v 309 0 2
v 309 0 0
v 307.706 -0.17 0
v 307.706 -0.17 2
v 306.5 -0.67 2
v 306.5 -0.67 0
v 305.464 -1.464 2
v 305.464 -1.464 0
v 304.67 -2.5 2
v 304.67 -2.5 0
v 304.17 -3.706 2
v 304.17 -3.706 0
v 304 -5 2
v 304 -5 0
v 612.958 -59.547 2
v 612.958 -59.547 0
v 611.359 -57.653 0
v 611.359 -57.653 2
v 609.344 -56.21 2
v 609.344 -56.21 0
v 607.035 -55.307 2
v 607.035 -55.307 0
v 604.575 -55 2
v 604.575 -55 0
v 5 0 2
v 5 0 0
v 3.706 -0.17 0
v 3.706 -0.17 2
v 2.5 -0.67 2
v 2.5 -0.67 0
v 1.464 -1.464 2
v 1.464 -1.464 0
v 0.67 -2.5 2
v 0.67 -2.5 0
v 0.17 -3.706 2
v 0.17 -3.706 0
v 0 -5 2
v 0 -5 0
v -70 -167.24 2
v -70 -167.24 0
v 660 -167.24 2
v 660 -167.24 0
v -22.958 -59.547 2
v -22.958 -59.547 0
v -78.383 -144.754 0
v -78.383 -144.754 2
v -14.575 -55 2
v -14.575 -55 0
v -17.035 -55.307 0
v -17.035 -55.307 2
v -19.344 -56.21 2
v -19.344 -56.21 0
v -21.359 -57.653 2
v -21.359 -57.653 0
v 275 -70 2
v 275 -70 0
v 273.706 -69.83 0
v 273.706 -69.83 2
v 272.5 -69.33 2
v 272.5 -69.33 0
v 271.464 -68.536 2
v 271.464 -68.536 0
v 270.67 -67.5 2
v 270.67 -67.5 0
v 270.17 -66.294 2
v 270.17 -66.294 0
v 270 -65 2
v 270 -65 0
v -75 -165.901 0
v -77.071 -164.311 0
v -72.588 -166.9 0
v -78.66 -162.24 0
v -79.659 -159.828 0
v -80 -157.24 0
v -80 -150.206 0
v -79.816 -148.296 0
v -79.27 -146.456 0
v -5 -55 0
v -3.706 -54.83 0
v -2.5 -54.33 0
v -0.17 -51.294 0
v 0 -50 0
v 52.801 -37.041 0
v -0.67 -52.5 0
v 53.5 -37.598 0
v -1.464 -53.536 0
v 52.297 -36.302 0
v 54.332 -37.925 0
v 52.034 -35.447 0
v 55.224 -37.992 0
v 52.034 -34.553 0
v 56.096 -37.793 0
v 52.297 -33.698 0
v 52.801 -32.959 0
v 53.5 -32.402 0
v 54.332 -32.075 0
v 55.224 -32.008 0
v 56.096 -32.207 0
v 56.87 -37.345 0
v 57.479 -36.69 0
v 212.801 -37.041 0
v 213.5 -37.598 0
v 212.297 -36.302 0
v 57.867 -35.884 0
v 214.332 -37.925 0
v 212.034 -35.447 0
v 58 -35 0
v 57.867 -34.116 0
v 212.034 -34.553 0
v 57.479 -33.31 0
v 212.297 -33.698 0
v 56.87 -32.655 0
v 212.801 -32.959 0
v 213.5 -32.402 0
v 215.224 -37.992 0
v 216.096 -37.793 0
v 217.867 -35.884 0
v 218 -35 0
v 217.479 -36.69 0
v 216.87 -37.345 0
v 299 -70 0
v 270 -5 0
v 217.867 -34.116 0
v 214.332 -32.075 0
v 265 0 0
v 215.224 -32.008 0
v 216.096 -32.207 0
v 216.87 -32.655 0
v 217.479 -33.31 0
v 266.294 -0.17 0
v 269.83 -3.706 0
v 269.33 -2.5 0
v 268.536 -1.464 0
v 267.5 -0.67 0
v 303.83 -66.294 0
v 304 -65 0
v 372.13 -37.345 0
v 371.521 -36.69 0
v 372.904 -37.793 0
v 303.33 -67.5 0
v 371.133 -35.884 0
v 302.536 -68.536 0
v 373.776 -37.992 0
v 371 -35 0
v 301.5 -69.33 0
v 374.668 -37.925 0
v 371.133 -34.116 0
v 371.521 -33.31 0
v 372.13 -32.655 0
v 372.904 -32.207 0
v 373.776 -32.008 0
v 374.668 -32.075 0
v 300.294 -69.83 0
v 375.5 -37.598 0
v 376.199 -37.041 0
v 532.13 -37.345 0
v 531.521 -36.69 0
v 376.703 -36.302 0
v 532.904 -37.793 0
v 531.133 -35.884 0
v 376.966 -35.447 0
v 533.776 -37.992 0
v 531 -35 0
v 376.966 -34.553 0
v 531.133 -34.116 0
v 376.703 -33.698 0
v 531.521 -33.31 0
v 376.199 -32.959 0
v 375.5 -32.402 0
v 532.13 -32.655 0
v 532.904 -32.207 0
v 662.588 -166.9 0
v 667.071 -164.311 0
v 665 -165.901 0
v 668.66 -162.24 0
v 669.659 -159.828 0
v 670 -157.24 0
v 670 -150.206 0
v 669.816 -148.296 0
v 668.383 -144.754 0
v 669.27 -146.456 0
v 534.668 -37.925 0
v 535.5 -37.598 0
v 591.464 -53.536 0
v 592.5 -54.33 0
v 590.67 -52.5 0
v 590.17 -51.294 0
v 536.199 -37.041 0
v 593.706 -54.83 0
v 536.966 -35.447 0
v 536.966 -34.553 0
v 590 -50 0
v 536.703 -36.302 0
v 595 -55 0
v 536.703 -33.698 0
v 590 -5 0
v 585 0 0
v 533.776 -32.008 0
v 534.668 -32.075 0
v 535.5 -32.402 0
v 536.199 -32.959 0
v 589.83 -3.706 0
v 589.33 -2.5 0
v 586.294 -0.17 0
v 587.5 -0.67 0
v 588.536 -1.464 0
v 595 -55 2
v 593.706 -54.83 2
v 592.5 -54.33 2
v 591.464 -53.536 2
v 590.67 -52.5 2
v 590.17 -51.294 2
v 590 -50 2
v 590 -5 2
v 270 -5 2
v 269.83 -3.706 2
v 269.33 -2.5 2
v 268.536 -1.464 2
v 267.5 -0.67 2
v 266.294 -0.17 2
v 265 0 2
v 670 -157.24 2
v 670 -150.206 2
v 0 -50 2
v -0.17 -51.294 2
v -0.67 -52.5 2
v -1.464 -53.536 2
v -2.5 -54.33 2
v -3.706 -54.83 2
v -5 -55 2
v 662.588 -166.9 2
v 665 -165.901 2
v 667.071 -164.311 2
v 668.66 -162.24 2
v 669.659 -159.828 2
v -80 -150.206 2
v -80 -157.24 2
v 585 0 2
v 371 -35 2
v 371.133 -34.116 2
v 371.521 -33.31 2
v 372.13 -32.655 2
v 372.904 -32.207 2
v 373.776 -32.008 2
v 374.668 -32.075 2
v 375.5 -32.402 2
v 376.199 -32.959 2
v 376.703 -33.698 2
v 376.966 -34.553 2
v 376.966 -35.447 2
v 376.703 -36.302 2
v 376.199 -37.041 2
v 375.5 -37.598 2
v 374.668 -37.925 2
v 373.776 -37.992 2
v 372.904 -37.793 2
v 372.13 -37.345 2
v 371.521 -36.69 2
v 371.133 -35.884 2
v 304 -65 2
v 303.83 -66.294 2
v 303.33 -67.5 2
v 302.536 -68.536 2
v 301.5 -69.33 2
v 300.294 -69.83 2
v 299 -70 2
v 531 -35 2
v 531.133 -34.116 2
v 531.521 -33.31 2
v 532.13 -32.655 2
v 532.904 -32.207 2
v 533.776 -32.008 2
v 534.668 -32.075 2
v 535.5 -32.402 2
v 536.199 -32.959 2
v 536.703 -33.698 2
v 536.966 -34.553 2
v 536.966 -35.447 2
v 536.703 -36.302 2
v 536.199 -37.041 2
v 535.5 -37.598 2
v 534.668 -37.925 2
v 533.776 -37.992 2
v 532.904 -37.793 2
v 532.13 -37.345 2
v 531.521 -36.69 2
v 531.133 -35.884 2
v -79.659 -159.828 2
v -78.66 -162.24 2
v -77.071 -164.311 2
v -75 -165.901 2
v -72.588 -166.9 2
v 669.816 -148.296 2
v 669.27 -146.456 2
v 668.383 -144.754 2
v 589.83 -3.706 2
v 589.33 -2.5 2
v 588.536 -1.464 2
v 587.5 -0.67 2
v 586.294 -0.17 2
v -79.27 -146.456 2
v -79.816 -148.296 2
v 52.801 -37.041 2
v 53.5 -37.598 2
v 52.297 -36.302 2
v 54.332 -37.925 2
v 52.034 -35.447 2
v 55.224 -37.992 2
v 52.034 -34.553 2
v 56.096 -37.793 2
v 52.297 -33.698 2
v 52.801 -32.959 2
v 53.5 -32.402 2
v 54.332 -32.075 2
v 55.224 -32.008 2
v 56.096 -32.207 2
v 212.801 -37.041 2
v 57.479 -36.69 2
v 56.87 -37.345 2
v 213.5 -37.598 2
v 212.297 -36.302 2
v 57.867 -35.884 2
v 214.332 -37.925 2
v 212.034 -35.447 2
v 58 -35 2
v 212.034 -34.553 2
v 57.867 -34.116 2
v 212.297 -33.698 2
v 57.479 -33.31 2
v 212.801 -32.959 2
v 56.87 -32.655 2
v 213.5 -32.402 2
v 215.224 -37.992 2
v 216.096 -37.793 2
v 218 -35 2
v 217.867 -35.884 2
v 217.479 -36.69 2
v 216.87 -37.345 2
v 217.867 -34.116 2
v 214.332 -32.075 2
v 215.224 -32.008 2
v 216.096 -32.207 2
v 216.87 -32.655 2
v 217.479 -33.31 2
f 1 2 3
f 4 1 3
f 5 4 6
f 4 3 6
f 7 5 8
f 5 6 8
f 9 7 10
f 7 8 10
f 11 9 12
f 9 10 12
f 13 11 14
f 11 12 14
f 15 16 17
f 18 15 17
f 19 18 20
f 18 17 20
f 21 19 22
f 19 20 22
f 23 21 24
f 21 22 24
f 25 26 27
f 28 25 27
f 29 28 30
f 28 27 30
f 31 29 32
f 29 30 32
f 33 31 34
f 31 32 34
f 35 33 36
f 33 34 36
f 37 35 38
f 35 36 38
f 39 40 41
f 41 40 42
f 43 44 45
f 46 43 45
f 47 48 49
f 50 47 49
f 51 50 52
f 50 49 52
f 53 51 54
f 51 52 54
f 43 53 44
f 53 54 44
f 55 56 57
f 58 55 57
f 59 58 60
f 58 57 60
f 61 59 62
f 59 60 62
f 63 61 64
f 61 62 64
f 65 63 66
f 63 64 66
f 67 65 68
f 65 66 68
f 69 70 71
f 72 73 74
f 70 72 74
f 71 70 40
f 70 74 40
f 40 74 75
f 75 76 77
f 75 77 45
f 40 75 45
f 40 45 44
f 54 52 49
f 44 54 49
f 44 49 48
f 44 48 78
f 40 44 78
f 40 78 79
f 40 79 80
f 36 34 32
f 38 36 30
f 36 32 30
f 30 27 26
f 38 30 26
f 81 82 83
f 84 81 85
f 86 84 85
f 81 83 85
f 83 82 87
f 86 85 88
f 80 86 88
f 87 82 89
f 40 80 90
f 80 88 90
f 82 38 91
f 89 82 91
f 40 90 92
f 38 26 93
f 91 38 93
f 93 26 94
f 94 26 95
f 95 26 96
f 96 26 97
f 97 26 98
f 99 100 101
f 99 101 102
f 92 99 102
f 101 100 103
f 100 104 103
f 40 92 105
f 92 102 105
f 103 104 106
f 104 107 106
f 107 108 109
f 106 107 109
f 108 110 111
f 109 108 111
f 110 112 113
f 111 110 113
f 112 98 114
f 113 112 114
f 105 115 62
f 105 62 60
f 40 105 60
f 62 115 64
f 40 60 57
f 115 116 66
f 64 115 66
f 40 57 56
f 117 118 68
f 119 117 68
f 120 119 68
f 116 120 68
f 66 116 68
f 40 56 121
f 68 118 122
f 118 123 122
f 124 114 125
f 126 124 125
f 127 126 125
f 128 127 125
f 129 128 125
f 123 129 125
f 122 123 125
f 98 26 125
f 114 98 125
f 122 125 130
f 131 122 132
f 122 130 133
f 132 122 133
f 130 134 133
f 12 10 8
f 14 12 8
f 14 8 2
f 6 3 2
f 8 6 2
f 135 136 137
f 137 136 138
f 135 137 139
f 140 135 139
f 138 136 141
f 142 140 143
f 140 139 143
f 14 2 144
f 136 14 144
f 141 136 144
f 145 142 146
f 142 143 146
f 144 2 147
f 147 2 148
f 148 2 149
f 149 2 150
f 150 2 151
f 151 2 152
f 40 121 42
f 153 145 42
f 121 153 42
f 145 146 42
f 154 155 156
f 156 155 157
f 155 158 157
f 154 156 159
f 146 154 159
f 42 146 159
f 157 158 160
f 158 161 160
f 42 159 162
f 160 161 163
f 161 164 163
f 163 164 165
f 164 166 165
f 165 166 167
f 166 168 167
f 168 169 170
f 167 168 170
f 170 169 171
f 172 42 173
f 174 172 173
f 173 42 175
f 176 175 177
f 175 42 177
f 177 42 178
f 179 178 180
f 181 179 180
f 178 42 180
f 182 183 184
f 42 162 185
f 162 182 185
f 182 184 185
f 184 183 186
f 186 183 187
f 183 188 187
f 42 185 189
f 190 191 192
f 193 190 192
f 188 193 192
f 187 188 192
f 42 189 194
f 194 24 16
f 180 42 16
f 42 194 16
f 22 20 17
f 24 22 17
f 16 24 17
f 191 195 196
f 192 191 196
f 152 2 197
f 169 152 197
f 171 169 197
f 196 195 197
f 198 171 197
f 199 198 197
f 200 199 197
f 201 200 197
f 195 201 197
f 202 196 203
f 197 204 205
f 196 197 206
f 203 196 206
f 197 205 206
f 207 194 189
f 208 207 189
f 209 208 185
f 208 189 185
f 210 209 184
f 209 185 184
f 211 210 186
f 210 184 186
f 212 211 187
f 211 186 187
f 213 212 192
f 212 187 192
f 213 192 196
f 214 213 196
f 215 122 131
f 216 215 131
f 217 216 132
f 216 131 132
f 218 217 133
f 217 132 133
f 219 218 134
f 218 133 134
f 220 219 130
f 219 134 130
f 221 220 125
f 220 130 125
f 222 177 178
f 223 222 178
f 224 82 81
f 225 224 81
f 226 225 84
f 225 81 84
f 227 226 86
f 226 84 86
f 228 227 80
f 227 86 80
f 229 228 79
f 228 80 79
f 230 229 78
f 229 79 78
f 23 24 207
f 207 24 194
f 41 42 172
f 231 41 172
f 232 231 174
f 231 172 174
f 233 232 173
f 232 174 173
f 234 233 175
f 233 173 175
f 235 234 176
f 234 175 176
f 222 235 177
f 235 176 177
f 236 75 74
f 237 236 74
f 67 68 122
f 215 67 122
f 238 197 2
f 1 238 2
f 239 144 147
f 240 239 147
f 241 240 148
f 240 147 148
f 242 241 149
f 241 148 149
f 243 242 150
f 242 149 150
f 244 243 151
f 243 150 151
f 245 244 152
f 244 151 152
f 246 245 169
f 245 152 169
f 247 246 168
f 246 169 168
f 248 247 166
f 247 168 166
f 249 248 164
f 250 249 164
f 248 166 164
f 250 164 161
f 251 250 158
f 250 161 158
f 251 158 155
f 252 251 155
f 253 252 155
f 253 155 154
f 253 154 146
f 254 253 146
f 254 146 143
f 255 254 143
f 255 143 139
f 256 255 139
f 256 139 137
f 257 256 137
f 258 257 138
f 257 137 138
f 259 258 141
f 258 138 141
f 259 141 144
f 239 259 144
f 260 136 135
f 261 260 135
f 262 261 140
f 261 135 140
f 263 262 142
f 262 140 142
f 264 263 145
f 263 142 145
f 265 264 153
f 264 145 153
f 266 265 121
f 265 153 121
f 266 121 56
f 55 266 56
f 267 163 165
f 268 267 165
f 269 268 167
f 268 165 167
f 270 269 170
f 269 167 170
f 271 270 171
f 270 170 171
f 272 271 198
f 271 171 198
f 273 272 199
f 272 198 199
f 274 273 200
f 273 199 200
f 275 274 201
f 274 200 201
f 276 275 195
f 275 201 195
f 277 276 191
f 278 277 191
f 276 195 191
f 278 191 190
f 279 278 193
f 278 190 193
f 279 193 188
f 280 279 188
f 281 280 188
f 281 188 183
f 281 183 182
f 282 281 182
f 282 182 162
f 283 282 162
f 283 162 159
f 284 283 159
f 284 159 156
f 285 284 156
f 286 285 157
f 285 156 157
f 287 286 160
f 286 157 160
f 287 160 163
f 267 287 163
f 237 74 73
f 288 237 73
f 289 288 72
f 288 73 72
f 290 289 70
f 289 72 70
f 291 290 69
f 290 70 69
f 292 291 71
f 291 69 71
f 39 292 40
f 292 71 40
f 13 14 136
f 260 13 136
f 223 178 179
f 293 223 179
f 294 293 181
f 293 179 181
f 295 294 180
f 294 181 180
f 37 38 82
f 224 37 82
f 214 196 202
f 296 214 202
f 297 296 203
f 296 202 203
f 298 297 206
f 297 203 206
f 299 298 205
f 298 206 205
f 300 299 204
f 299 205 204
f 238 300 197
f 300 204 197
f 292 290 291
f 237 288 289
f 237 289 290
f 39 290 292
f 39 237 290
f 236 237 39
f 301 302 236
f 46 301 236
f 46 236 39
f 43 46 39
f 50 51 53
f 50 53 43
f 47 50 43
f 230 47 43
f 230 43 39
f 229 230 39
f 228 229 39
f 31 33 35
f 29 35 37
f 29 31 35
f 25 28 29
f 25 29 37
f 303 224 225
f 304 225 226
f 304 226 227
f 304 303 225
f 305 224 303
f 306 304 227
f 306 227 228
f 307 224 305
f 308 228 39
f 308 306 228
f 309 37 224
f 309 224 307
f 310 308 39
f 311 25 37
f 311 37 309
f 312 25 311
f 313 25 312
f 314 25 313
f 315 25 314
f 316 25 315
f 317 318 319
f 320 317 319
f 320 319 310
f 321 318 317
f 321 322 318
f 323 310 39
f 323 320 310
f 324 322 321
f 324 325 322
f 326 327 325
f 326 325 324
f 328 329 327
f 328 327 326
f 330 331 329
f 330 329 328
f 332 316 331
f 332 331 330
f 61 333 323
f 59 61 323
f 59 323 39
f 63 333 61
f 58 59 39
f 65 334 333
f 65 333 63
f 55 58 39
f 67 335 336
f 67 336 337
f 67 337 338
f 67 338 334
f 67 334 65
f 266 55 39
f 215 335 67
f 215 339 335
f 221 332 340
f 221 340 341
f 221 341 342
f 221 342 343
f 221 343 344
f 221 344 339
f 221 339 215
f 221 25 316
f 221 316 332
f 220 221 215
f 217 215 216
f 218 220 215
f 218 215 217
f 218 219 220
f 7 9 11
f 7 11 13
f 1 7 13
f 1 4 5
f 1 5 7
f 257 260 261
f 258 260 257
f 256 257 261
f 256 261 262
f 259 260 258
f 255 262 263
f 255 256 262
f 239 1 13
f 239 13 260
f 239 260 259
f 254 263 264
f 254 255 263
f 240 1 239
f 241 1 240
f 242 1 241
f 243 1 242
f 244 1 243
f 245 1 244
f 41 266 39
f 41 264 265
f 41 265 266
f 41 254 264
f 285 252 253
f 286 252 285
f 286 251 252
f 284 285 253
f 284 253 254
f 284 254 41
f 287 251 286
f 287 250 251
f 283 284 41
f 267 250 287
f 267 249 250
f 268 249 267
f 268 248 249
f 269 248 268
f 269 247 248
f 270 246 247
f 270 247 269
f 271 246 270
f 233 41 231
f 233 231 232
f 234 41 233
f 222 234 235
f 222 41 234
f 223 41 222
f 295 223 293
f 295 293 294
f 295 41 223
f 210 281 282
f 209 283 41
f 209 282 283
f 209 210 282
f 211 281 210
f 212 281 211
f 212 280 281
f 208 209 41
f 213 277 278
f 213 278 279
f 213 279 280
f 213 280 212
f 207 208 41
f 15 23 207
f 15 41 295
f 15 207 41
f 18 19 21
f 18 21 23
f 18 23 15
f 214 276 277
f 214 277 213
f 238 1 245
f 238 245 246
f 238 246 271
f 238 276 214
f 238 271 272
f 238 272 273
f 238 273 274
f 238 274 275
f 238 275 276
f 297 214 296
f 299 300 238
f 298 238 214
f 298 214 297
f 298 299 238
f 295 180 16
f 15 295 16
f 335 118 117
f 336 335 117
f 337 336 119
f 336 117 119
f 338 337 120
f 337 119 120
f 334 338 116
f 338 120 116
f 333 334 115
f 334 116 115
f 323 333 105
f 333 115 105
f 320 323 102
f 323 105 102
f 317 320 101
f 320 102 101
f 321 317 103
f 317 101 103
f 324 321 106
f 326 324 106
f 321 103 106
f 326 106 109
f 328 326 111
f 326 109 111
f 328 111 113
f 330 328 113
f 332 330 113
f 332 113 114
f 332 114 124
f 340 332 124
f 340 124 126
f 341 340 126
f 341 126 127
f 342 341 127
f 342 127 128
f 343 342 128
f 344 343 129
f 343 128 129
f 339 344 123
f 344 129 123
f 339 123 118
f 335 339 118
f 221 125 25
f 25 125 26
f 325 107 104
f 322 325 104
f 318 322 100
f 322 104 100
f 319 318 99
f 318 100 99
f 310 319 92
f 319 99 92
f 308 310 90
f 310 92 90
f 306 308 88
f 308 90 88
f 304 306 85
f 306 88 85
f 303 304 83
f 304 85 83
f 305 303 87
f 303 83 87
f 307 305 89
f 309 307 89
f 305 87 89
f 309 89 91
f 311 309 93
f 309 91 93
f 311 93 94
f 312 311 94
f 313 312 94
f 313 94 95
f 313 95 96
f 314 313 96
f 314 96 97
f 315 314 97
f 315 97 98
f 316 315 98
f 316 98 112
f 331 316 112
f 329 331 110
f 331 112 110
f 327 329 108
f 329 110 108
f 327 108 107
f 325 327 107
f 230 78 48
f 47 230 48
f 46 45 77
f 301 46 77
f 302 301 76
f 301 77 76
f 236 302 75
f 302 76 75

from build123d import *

# Parameters (mm, degrees)
F1_DEPTH = 2


with BuildPart() as f1:
    # F0 (on Top) → F1 (new body)
    with BuildSketch(Plane.XY):
        with BuildLine():
            Line((265, 0), (5, 0))
            ThreePointArc((5, 0), (1.464466, -1.464466), (0, -5))
            Line((0, -5), (0, -50))
            ThreePointArc((0, -50), (-1.464466, -53.535534), (-5, -55))
            Line((-5, -55), (-14.575301, -55))
            ThreePointArc((-14.575301, -55), (-19.34359, -56.210039), (-22.957917, -59.547316))
            Line((-22.957917, -59.547316), (-78.382615, -144.753785))
            ThreePointArc((-78.382615, -144.753785), (-79.587131, -147.362717), (-80, -150.206469))
            Line((-80, -150.206469), (-80, -157.240251))
            ThreePointArc((-80, -157.240251), (-77.071068, -164.311319), (-70, -167.240251))
            Line((-70, -167.240251), (660, -167.240251))
            ThreePointArc((660, -167.240251), (667.071068, -164.311319), (670, -157.240251))
            Line((670, -157.240251), (670, -150.206469))
            ThreePointArc((670, -150.206469), (669.587131, -147.362717), (668.382615, -144.753785))
            Line((668.382615, -144.753785), (612.957917, -59.547316))
            ThreePointArc((612.957917, -59.547316), (609.34359, -56.210039), (604.575301, -55))
            Line((604.575301, -55), (595, -55))
            ThreePointArc((595, -55), (591.464466, -53.535534), (590, -50))
            Line((590, -50), (590, -5))
            ThreePointArc((590, -5), (588.535534, -1.464466), (585, 0))
            Line((585, 0), (309, 0))
            ThreePointArc((309, 0), (305.464466, -1.464466), (304, -5))
            Line((304, -5), (304, -35))
            Line((304, -35), (304, -55))
            Line((304, -55), (304, -65))
            ThreePointArc((304, -65), (302.535534, -68.535534), (299, -70))
            Line((299, -70), (275, -70))
            ThreePointArc((275, -70), (271.464466, -68.535534), (270, -65))
            Line((270, -65), (270, -55))
            Line((270, -55), (270, -35))
            Line((270, -35), (270, -5))
            ThreePointArc((270, -5), (268.535534, -1.464466), (265, 0))
        make_face()
        with BuildLine():
            ThreePointArc((52, -35), (55, -32), (58, -35))
            ThreePointArc((58, -35), (55, -38), (52, -35))
        make_face(mode=Mode.SUBTRACT)
        with BuildLine():
            ThreePointArc((212, -35), (215, -32), (218, -35))
            ThreePointArc((218, -35), (215, -38), (212, -35))
        make_face(mode=Mode.SUBTRACT)
        with BuildLine():
            ThreePointArc((377, -35), (374, -38), (371, -35))
            ThreePointArc((371, -35), (374, -32), (377, -35))
        make_face(mode=Mode.SUBTRACT)
        with BuildLine():
            ThreePointArc((537, -35), (534, -38), (531, -35))
            ThreePointArc((531, -35), (534, -32), (537, -35))
        make_face(mode=Mode.SUBTRACT)
    extrude(amount=F1_DEPTH)


solid = f1.part
